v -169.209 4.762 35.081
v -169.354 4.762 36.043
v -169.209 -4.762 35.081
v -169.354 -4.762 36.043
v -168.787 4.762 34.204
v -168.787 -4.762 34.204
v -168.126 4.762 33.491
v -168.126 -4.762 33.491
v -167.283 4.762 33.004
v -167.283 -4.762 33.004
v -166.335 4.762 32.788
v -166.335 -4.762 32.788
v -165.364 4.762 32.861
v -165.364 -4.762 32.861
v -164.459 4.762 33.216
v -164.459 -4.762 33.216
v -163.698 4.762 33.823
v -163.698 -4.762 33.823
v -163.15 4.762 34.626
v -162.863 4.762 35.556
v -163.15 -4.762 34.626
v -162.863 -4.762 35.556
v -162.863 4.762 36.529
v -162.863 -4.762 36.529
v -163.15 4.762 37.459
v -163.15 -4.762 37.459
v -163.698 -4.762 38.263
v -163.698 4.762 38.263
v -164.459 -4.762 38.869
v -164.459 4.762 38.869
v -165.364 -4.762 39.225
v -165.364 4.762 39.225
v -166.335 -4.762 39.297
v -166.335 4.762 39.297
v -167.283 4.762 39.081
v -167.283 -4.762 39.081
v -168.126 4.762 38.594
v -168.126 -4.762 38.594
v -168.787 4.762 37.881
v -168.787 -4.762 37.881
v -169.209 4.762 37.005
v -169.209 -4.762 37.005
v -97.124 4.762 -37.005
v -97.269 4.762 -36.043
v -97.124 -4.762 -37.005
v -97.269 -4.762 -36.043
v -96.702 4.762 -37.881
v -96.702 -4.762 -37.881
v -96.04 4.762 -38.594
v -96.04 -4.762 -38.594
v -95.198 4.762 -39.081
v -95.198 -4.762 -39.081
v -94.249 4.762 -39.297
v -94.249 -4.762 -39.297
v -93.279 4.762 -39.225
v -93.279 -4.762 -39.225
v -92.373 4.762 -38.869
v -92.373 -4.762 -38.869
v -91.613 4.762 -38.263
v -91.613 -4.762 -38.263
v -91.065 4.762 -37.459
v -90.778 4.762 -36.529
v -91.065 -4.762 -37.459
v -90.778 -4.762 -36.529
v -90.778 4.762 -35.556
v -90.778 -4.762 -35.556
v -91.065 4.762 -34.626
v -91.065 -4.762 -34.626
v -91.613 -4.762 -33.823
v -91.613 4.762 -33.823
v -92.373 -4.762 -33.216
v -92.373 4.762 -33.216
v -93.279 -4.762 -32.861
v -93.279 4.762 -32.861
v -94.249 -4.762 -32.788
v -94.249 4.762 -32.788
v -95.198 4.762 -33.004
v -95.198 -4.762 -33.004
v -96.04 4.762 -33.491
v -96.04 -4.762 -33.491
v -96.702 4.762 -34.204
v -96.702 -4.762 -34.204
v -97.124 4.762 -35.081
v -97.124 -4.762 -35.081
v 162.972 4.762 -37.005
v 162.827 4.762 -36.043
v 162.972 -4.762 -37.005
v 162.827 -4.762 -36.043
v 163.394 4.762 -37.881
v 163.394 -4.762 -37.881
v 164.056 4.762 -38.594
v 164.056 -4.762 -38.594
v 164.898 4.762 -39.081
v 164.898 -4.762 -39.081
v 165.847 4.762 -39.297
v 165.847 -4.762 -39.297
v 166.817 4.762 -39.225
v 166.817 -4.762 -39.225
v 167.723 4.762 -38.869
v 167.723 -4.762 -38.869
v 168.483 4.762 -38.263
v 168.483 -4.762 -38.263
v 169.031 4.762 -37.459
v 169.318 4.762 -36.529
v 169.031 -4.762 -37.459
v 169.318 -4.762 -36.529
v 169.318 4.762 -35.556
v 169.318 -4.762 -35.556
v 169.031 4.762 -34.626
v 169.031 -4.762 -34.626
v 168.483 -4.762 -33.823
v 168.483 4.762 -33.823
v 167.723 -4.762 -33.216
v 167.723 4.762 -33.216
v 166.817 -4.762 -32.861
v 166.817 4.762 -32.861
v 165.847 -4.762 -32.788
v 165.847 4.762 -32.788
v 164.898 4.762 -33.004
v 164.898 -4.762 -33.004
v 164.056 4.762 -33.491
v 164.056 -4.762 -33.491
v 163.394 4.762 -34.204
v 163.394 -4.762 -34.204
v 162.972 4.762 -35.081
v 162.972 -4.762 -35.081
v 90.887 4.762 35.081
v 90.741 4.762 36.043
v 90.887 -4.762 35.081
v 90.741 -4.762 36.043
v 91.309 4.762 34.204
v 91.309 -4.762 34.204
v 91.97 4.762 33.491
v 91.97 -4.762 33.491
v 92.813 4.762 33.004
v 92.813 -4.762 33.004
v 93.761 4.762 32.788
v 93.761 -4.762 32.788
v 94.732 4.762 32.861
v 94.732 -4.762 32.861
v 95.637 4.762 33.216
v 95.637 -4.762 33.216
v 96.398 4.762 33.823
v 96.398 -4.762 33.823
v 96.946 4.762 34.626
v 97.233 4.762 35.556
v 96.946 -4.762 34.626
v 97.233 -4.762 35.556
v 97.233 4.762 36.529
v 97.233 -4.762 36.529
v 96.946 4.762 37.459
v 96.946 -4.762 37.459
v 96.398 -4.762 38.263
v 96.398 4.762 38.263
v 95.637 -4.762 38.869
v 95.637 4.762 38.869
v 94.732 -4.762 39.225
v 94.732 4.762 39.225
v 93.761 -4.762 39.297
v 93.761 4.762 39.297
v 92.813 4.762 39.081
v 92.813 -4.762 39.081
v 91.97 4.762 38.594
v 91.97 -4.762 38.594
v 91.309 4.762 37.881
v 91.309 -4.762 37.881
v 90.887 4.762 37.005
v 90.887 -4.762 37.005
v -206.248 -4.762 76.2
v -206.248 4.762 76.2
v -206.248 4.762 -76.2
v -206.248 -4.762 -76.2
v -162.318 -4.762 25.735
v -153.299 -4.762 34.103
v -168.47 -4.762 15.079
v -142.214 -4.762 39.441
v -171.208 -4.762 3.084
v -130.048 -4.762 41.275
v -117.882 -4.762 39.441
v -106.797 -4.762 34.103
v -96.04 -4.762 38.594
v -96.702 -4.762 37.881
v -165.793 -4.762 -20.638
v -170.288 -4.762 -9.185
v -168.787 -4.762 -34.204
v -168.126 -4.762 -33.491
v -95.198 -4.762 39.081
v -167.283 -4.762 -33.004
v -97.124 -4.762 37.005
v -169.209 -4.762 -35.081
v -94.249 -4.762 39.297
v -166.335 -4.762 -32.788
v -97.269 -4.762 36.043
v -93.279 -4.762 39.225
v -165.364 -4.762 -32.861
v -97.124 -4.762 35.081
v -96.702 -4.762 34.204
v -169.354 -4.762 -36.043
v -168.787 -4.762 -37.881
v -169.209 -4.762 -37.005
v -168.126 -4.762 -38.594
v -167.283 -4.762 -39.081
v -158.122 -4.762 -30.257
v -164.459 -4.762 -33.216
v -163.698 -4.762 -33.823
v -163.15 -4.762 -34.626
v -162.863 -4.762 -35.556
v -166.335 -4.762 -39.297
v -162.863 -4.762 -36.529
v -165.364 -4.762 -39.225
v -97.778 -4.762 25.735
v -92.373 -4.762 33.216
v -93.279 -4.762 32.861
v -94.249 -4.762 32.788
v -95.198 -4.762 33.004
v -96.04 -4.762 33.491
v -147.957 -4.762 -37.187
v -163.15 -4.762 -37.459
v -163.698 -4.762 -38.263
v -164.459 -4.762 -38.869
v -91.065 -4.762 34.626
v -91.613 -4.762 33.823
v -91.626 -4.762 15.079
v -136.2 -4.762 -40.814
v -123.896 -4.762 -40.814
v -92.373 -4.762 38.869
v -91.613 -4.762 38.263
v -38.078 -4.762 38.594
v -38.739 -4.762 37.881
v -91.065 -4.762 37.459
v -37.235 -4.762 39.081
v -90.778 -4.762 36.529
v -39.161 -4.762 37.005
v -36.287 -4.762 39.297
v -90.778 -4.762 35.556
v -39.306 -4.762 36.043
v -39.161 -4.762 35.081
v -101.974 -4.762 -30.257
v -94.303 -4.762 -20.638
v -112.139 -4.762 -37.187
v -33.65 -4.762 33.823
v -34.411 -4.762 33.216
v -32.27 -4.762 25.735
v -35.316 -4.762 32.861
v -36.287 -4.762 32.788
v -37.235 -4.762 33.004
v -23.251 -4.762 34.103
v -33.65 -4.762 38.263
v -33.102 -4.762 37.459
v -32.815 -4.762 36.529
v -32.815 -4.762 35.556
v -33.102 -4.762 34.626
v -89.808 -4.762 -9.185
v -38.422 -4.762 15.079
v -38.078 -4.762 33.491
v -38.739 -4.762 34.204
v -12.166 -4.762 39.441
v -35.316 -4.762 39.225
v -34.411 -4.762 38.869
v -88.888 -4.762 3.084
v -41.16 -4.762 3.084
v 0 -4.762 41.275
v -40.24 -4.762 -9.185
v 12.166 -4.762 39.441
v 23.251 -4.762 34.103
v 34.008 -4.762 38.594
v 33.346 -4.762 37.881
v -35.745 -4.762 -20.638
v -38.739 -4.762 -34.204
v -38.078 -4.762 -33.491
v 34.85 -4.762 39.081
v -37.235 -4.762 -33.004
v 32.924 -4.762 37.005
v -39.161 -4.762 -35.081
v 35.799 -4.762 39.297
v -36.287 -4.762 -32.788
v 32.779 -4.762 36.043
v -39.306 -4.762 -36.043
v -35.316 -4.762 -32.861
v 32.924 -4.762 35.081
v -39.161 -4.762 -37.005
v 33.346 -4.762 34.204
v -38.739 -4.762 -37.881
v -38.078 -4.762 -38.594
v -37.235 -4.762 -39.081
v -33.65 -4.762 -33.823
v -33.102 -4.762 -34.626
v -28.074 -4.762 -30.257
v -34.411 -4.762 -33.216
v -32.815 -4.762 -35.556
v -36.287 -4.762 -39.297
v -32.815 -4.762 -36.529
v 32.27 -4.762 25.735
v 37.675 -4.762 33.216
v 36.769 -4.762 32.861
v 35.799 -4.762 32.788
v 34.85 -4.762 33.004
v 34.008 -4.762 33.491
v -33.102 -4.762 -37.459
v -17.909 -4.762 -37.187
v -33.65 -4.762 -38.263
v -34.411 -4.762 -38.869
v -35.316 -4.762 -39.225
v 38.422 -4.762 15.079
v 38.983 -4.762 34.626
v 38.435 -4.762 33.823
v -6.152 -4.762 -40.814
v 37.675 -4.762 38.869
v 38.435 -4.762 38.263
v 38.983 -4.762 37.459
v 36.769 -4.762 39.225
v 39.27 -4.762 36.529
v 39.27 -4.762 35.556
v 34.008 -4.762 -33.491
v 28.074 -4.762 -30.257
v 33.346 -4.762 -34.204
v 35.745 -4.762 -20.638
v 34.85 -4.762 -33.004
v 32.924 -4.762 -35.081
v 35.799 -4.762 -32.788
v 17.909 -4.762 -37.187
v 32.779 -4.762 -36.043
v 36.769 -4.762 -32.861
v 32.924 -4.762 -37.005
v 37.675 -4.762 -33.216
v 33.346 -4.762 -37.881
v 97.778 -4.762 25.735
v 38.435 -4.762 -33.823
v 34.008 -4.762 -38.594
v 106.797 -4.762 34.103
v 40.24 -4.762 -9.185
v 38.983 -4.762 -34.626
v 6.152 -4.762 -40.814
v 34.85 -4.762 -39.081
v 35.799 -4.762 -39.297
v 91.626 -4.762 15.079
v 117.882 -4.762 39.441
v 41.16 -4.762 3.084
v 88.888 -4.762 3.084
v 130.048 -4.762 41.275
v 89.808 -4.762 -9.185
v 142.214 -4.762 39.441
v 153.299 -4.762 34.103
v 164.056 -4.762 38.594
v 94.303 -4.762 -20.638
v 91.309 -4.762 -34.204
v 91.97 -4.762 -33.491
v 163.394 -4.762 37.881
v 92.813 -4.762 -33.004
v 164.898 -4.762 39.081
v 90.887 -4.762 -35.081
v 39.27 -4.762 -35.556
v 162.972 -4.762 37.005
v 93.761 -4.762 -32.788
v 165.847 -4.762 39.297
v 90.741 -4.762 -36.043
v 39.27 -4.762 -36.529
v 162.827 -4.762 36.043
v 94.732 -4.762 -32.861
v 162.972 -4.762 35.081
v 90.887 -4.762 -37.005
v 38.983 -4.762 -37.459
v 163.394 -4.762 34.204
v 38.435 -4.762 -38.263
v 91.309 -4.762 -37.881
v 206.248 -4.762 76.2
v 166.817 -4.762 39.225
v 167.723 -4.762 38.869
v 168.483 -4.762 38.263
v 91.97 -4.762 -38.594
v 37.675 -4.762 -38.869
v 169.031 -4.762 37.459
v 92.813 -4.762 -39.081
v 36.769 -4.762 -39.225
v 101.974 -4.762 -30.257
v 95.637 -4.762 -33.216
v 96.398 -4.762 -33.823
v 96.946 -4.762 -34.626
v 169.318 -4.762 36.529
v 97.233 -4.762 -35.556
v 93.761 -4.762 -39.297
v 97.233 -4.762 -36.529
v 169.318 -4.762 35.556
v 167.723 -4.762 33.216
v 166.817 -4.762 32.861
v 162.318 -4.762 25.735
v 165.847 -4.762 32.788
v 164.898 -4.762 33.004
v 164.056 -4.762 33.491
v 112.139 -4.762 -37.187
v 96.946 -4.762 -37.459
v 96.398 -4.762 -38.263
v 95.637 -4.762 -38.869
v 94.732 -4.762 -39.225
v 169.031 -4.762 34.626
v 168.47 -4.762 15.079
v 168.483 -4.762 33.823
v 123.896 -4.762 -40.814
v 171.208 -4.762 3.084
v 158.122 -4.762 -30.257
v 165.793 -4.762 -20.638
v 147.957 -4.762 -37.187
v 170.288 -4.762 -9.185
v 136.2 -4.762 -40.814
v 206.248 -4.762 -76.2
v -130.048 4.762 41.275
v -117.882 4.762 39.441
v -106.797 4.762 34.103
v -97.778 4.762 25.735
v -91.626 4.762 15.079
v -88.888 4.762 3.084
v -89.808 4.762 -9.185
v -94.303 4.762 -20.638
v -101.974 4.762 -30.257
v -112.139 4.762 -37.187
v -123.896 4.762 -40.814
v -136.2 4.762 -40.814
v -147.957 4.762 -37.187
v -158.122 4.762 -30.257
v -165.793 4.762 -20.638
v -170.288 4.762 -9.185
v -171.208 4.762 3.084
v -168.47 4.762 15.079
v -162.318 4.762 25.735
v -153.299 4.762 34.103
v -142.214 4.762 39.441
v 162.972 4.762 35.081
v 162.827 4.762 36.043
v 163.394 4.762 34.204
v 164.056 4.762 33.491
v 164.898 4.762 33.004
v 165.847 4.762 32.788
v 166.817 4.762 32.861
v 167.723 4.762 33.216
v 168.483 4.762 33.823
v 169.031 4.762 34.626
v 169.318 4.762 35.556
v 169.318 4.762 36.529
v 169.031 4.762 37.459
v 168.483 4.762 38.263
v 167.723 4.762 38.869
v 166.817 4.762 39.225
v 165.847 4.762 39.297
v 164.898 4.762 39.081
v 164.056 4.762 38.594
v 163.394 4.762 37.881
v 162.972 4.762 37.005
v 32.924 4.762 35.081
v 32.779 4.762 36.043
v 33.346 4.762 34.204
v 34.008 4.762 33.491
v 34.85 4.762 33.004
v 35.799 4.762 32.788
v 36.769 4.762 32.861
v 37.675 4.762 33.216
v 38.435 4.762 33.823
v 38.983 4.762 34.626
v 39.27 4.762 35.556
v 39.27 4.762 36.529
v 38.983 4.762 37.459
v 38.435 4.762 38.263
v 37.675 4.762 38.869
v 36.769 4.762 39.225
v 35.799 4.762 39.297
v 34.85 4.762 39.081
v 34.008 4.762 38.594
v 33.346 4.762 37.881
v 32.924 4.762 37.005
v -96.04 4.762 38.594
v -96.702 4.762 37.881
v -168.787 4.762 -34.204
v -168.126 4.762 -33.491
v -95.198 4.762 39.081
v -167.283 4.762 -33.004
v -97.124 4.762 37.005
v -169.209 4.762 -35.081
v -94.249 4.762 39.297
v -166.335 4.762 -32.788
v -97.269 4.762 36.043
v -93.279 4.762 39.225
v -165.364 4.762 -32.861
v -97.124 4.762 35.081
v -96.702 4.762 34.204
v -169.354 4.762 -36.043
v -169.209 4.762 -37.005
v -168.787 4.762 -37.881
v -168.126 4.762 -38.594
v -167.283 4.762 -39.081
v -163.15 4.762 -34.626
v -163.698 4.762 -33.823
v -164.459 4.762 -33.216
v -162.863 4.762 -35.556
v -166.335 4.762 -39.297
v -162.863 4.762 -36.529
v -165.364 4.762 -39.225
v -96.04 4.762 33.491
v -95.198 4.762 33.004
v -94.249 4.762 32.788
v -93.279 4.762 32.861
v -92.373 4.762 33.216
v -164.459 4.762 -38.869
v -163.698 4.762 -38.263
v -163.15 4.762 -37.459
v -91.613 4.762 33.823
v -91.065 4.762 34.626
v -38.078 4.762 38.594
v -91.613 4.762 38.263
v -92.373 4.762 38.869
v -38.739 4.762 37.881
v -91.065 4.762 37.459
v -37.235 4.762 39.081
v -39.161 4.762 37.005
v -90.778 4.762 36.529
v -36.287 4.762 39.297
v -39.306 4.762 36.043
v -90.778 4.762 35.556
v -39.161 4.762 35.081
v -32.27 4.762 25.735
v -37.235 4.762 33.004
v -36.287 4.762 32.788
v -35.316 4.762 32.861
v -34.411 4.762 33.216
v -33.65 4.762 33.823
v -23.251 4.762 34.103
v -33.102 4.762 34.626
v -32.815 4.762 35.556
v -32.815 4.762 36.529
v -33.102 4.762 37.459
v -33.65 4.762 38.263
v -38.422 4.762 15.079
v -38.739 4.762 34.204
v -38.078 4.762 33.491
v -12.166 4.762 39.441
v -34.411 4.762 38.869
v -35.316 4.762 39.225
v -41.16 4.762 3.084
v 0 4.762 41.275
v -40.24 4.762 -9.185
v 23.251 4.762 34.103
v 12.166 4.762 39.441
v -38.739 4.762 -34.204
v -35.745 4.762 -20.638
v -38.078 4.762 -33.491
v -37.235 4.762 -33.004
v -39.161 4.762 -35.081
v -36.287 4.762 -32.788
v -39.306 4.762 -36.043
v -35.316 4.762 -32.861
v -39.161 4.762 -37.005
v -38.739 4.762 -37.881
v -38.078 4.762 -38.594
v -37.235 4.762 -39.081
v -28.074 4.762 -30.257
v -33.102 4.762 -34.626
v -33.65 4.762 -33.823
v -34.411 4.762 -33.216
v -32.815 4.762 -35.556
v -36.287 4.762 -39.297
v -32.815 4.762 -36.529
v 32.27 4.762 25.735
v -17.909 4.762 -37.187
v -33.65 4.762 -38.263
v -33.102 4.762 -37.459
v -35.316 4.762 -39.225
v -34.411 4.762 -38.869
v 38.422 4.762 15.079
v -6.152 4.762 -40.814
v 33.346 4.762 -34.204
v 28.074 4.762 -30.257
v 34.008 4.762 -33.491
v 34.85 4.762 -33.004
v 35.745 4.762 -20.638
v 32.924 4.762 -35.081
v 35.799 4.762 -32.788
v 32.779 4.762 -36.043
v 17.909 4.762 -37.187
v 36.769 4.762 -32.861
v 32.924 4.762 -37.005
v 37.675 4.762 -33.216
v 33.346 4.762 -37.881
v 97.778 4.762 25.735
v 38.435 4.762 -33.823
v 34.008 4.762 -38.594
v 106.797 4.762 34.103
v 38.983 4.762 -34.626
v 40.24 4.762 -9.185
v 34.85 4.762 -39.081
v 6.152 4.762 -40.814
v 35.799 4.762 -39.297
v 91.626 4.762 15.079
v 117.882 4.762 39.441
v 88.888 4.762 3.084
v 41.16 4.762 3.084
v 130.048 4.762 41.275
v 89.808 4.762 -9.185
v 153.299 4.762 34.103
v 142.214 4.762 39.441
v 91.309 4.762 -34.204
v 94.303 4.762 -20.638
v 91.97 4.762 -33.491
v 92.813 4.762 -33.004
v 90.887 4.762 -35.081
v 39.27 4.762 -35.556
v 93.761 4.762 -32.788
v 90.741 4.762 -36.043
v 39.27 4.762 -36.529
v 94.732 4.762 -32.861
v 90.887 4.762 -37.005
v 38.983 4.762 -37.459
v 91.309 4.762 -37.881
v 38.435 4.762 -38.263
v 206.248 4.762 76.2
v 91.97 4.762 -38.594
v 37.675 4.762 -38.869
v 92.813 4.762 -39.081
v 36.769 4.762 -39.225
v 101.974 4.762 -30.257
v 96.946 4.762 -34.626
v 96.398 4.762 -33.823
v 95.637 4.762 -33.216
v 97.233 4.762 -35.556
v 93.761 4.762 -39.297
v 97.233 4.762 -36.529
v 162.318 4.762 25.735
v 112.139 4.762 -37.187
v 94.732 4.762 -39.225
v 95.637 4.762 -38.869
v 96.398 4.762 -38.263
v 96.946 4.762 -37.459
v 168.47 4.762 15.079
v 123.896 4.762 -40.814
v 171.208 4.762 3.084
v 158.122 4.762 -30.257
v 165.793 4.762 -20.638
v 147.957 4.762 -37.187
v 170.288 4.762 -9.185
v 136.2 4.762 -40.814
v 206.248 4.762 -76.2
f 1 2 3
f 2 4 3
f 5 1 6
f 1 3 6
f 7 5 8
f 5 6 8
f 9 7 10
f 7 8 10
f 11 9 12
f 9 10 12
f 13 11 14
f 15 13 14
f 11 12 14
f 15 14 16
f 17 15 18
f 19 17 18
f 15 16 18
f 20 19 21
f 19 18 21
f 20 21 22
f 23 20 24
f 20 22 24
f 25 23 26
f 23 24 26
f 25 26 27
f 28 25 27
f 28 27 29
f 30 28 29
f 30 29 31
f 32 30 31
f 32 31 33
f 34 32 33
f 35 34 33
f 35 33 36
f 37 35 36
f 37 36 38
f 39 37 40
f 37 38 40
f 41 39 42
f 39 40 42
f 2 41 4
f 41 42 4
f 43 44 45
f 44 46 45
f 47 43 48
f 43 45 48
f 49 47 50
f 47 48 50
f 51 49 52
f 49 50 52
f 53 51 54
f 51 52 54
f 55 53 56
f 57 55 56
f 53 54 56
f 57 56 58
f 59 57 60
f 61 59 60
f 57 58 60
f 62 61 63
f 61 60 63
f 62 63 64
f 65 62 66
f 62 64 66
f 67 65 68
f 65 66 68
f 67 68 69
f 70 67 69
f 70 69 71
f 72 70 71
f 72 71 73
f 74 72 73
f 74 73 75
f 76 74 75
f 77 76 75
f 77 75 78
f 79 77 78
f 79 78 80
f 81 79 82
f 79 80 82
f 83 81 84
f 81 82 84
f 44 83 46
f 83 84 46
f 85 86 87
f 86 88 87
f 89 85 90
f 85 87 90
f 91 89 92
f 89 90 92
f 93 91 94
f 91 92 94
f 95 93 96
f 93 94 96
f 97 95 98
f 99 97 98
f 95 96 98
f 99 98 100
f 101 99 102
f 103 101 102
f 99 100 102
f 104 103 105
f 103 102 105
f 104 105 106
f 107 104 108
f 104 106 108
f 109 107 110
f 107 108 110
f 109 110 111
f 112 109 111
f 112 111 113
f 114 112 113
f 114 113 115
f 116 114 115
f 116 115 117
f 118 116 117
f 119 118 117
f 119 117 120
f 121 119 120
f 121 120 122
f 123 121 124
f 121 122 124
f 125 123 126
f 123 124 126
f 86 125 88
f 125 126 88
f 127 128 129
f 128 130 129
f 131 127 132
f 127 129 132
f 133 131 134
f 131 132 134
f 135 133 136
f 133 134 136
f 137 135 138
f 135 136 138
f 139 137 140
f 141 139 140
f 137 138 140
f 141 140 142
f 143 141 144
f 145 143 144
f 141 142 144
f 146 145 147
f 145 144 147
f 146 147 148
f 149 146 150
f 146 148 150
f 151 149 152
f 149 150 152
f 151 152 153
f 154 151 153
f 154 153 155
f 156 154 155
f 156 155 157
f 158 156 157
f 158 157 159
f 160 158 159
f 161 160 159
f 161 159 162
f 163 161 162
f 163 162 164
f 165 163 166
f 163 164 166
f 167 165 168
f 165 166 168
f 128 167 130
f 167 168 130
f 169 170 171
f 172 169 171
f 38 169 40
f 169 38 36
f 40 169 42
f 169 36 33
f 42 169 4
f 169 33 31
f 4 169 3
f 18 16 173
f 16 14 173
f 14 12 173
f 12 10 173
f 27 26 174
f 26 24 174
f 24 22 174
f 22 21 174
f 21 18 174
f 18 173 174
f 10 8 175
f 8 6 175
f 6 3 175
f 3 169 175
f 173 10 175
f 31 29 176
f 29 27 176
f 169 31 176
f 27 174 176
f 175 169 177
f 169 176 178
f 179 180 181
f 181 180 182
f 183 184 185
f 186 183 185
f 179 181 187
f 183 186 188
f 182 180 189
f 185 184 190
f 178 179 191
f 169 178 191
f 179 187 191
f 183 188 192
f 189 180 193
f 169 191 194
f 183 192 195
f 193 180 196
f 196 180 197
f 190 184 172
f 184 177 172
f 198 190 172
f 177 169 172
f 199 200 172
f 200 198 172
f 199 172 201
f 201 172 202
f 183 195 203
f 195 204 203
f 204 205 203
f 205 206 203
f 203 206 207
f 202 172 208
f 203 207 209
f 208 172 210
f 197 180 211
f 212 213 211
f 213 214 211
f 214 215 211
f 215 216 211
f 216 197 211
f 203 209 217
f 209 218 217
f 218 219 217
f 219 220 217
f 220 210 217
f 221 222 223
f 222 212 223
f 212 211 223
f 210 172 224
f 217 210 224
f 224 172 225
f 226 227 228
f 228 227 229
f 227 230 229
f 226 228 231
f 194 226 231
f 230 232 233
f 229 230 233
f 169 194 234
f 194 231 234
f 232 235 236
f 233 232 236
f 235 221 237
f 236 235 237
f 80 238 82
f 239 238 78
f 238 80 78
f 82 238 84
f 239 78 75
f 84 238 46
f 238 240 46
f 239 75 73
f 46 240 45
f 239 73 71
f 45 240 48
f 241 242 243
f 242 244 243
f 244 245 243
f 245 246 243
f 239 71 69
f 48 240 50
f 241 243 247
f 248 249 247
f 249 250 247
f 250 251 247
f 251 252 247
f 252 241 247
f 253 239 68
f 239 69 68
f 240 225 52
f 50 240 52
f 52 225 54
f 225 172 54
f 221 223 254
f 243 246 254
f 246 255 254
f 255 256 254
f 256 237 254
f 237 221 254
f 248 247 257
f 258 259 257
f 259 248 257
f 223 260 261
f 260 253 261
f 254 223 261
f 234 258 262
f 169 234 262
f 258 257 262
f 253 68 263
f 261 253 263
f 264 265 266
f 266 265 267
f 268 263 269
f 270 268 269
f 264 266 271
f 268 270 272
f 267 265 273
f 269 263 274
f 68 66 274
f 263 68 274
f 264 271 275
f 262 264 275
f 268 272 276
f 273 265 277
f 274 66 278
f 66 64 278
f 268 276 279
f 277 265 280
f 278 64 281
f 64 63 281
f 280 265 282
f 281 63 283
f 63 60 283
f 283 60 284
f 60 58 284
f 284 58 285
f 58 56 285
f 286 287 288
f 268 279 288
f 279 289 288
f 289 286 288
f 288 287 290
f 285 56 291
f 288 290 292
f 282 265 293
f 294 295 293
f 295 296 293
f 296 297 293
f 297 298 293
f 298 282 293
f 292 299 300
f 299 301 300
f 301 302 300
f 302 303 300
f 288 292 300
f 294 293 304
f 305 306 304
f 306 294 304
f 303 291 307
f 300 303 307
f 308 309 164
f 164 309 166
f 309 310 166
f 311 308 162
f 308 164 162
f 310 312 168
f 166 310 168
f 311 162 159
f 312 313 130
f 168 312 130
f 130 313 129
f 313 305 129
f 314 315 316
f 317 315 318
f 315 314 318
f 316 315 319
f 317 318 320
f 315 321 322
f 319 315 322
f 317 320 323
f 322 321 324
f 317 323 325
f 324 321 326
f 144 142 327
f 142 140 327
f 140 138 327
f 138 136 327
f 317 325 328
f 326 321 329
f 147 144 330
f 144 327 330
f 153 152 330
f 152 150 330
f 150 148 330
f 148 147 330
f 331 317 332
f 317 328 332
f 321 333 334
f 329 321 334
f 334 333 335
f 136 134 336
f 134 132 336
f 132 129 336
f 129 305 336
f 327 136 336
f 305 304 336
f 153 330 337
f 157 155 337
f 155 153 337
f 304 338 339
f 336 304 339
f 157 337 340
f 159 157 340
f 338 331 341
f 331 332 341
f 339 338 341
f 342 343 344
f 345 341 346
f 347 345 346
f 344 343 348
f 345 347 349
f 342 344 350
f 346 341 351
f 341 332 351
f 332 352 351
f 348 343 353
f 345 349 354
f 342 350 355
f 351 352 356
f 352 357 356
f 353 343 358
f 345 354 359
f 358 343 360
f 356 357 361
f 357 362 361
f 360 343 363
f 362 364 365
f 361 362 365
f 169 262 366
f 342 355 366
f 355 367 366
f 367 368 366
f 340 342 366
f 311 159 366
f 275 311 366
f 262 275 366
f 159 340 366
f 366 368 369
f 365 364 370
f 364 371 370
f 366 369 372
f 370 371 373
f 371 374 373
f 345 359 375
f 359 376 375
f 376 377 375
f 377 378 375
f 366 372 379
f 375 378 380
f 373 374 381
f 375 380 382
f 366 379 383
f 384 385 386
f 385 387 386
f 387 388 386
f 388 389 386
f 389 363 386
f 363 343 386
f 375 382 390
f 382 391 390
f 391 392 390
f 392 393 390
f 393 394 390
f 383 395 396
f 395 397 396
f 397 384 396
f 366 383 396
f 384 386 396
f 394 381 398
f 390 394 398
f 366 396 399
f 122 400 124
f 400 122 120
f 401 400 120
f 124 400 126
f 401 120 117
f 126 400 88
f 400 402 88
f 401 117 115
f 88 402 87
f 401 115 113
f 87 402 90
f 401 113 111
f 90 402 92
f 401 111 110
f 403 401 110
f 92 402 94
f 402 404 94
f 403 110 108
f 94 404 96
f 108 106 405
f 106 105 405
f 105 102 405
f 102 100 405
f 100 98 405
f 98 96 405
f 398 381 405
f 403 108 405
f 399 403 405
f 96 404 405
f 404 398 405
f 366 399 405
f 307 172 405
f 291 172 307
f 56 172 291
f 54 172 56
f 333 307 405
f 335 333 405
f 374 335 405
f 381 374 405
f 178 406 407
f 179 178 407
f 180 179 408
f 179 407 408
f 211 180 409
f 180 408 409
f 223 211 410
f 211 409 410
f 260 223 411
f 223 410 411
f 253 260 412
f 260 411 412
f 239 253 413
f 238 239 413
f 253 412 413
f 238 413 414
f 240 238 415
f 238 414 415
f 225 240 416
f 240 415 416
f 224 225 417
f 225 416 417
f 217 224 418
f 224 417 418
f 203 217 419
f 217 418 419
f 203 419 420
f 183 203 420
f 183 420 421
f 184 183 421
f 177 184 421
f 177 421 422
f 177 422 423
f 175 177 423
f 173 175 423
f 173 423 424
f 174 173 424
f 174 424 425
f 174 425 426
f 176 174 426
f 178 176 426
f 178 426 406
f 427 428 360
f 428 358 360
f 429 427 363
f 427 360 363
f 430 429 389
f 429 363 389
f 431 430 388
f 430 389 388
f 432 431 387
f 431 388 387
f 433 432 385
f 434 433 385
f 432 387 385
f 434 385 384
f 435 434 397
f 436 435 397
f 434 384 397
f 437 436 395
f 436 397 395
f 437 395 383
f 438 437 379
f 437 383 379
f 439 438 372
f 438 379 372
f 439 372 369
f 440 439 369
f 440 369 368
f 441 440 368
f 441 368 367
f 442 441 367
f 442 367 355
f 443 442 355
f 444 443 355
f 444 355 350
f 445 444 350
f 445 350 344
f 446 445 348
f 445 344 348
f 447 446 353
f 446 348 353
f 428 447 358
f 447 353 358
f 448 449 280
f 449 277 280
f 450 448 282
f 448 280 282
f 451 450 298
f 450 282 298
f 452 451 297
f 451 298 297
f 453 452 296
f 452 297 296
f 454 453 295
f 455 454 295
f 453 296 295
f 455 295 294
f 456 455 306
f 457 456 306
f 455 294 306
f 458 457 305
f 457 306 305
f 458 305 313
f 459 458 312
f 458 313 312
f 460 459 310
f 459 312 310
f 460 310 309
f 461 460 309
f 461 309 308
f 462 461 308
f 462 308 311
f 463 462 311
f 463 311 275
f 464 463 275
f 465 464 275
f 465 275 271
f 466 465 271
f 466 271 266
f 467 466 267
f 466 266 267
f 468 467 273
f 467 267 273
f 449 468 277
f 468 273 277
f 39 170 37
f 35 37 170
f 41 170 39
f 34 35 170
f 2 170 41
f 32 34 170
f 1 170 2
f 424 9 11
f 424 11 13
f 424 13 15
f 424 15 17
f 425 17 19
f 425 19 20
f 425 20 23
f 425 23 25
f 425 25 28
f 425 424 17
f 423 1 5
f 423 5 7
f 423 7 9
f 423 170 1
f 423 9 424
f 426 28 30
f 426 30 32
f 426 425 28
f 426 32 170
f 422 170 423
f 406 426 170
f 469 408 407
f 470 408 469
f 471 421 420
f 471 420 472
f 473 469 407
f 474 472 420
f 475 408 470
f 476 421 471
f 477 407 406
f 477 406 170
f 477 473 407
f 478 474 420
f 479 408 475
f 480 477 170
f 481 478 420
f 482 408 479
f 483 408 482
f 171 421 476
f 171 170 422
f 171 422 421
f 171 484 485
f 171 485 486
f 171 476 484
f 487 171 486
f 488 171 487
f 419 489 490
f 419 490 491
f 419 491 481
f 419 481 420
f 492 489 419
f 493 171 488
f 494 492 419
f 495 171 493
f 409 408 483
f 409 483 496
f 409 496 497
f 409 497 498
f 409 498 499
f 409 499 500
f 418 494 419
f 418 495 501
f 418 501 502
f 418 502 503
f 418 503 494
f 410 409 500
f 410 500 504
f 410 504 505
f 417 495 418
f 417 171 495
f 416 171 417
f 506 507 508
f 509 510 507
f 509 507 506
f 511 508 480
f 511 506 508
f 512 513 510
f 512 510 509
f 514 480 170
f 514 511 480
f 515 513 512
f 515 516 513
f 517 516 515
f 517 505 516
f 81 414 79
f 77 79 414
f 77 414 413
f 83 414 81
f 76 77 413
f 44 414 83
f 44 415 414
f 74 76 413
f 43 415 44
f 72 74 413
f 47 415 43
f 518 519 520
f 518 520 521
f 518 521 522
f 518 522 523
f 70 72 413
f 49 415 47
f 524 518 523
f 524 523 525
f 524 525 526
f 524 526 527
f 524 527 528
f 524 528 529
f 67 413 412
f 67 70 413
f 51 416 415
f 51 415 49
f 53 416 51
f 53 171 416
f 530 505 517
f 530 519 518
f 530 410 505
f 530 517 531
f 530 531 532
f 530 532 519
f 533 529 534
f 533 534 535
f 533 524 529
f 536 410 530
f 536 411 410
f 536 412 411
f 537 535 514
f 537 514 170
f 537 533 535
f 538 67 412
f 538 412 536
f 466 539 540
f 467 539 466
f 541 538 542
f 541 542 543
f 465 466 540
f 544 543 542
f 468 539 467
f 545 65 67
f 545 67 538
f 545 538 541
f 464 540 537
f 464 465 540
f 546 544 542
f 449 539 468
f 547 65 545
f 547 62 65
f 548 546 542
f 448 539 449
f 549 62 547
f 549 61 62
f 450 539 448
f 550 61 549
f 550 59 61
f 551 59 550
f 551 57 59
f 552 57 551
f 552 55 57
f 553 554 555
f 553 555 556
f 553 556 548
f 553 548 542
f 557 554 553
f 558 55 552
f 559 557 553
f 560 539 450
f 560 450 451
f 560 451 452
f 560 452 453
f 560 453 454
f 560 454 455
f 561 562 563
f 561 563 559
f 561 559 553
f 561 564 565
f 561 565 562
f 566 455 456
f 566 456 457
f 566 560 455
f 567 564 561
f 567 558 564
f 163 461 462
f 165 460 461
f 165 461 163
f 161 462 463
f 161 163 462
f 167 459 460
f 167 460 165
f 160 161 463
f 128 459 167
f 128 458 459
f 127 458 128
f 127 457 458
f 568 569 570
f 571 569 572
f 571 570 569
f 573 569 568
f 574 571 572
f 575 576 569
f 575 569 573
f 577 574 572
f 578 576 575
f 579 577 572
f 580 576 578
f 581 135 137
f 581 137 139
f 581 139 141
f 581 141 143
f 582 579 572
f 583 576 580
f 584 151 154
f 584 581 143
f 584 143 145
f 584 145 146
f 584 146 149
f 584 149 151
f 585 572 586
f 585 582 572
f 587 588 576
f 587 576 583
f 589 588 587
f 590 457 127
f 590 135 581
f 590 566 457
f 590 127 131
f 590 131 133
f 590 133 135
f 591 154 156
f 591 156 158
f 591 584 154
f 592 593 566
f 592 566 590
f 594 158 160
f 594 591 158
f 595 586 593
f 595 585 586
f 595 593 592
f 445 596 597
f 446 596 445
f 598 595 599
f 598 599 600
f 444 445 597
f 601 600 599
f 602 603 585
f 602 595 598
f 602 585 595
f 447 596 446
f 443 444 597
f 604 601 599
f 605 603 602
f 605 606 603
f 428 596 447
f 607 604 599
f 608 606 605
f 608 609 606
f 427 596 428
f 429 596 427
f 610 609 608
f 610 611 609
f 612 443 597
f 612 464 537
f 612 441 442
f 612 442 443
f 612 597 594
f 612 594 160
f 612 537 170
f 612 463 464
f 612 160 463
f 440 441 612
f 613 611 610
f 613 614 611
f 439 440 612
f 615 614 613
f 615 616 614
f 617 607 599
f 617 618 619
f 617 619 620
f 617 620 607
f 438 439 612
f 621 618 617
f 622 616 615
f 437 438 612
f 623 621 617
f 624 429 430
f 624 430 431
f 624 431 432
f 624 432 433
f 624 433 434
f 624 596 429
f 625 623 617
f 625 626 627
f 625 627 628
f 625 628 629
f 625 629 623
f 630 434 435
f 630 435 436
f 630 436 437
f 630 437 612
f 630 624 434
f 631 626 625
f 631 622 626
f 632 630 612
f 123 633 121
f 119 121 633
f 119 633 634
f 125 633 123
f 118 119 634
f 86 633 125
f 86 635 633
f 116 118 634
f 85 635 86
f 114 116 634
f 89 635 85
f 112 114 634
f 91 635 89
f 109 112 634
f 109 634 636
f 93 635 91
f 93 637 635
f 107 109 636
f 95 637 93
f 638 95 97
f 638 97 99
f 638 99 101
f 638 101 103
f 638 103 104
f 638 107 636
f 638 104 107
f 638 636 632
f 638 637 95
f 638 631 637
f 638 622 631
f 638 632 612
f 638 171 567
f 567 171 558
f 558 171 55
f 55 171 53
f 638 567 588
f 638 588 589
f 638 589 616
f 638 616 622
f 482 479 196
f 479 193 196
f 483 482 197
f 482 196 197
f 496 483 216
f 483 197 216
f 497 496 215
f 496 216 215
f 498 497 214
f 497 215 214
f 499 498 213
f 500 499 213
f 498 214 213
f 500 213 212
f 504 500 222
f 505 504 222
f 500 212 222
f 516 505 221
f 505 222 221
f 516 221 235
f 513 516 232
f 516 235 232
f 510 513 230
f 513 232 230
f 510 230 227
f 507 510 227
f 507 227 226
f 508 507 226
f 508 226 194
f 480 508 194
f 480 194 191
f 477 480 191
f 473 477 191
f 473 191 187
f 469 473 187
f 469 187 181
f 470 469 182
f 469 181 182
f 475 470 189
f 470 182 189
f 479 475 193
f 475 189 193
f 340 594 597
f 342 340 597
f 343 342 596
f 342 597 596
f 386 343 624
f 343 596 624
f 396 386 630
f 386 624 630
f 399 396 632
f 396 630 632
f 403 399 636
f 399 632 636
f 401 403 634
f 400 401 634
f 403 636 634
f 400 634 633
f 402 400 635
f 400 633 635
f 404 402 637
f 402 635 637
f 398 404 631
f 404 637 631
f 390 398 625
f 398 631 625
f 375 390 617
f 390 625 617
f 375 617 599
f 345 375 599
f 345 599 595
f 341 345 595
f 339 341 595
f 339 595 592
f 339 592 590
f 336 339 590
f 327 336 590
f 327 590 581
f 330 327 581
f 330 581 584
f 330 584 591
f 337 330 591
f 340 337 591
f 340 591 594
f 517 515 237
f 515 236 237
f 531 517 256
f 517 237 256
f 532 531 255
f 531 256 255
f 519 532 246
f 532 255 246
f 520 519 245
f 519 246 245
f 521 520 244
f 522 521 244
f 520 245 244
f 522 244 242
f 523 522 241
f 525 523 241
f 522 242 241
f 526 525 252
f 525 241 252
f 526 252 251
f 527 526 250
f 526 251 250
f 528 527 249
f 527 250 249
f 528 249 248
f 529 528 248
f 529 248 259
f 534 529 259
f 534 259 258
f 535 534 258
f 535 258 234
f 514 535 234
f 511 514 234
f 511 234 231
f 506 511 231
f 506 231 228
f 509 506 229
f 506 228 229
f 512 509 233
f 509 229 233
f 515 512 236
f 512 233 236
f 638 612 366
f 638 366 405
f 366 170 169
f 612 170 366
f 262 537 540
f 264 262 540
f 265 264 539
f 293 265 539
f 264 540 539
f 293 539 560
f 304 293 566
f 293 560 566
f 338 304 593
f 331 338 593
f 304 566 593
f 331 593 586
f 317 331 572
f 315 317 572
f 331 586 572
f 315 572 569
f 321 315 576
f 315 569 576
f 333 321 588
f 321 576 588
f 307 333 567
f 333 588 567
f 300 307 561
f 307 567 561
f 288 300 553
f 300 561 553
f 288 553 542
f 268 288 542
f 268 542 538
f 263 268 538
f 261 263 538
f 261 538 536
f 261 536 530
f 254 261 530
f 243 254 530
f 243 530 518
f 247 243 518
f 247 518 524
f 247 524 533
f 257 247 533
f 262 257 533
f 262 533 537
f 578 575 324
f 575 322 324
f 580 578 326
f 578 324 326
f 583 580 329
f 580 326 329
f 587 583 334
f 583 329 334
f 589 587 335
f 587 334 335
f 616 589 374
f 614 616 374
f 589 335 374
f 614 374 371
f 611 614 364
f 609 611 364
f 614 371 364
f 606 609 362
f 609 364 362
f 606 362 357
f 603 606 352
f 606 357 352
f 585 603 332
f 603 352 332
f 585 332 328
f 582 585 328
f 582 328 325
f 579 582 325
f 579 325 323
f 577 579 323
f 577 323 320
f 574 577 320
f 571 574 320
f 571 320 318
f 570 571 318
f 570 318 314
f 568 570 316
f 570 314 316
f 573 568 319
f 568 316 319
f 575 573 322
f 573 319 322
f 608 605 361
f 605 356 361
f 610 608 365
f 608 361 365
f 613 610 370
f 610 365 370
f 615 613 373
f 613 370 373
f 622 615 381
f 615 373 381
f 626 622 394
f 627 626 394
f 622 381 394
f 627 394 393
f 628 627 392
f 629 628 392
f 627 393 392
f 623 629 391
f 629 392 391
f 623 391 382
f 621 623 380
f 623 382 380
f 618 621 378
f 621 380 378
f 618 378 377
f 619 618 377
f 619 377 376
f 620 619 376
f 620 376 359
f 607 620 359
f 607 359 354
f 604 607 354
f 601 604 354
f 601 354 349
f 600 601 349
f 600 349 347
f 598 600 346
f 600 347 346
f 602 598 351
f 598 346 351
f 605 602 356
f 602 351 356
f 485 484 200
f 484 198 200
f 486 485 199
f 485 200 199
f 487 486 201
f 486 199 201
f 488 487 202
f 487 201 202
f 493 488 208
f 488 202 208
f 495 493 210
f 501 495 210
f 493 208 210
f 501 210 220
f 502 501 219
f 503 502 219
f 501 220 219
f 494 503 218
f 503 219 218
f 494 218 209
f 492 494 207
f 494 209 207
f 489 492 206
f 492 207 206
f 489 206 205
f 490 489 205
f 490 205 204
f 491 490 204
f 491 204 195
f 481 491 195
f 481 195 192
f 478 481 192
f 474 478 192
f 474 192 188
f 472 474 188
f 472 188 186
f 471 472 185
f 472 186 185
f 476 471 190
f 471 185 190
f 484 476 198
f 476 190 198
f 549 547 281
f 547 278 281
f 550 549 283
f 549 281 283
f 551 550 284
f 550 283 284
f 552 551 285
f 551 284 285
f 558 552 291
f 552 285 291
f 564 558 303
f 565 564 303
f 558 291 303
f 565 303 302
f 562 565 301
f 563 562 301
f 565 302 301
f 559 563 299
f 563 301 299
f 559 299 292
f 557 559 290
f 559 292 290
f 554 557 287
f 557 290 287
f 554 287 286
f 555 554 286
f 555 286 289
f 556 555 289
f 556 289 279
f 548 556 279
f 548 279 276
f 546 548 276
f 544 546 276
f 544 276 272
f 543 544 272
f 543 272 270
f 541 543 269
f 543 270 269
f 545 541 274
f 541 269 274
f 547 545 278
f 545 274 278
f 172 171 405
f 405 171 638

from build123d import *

# Parameters (mm, degrees)
SKETCH1_W                    = 412.496
SKETCH1_H                    = 152.4
BOSS_EXTRUDE1_DEPTH          = 4.7625
CUT_EXTRUDE2_START           = 4.7625
SKETCH2_R                    = 41.275
CUT_EXTRUDE2_DEPTH           = 225.688303193
F_5_16_18_TAPPED_HOLE1_D     = 6.5278
F_5_16_18_TAPPED_HOLE1_DEPTH = 9.525
F_5_16_18_TAPPED_HOLE1_TIP   = 1.961148974
F_5_16_18_TAPPED_HOLE2_D     = 6.5278
F_5_16_18_TAPPED_HOLE2_DEPTH = 9.525
F_5_16_18_TAPPED_HOLE2_TIP   = 1.961148974
F_5_16_18_TAPPED_HOLE3_D     = 6.5278
F_5_16_18_TAPPED_HOLE3_DEPTH = 9.525
F_5_16_18_TAPPED_HOLE3_TIP   = 1.961148974


with BuildPart() as part:
    # Sketch1 → Boss-Extrude1 (new, symmetric)
    with BuildSketch(Plane(origin=(0, 0, 0), x_dir=(1, 0, 0), z_dir=(0, 1, 0))):
        Rectangle(SKETCH1_W, SKETCH1_H)
    extrude(amount=BOSS_EXTRUDE1_DEPTH, both=True)

    # Sketch2 → Cut-Extrude2 (cut, through all)
    with BuildSketch(Plane(origin=(0, 0, 0), x_dir=(1, 0, 0), z_dir=(0, 1, 0)).offset(CUT_EXTRUDE2_START)):
        with Locations(Location((-130.048, 0, 0), (0, 0, 270))):
            Circle(SKETCH2_R)
        with Locations(Location((0, 0, 0), (0, 0, 270))):
            Circle(SKETCH2_R)
        with Locations(Location((130.048, 0, 0), (0, 0, 270))):
            Circle(SKETCH2_R)
    extrude(amount=-CUT_EXTRUDE2_DEPTH, mode=Mode.SUBTRACT)

    # 5/16-18 Tapped Hole1
    with Locations(Plane(origin=(0, 4.7625, 0), x_dir=(1, 0, 0), z_dir=(0, 1, 0))):
        with Locations((-166.0906, -36.0426), (-94.0054, -36.0426), (-166.0906, 36.0426), (-94.0054, 36.0426)):
            Hole(F_5_16_18_TAPPED_HOLE1_D / 2, depth=F_5_16_18_TAPPED_HOLE1_DEPTH)
            with Locations((0, 0, -(F_5_16_18_TAPPED_HOLE1_DEPTH + F_5_16_18_TAPPED_HOLE1_TIP / 2))):  # 118° drill point
                Cone(0, F_5_16_18_TAPPED_HOLE1_D / 2, F_5_16_18_TAPPED_HOLE1_TIP, mode=Mode.SUBTRACT)

    # 5/16-18 Tapped Hole2
    with Locations(Plane(origin=(0, 4.7625, 0), x_dir=(1, 0, 0), z_dir=(0, 1, 0))):
        with Locations((-36.0426, -36.0426), (36.0426, -36.0426), (-36.0426, 36.0426), (36.0426, 36.0426)):
            Hole(F_5_16_18_TAPPED_HOLE2_D / 2, depth=F_5_16_18_TAPPED_HOLE2_DEPTH)
            with Locations((0, 0, -(F_5_16_18_TAPPED_HOLE2_DEPTH + F_5_16_18_TAPPED_HOLE2_TIP / 2))):  # 118° drill point
                Cone(0, F_5_16_18_TAPPED_HOLE2_D / 2, F_5_16_18_TAPPED_HOLE2_TIP, mode=Mode.SUBTRACT)

    # 5/16-18 Tapped Hole3
    with Locations(Plane(origin=(0, 4.7625, 0), x_dir=(1, 0, 0), z_dir=(0, 1, 0))):
        with Locations((94.0054, -36.0426), (166.0906, -36.0426), (94.0054, 36.0426), (166.0906, 36.0426)):
            Hole(F_5_16_18_TAPPED_HOLE3_D / 2, depth=F_5_16_18_TAPPED_HOLE3_DEPTH)
            with Locations((0, 0, -(F_5_16_18_TAPPED_HOLE3_DEPTH + F_5_16_18_TAPPED_HOLE3_TIP / 2))):  # 118° drill point
                Cone(0, F_5_16_18_TAPPED_HOLE3_D / 2, F_5_16_18_TAPPED_HOLE3_TIP, mode=Mode.SUBTRACT)


solid = part.part
